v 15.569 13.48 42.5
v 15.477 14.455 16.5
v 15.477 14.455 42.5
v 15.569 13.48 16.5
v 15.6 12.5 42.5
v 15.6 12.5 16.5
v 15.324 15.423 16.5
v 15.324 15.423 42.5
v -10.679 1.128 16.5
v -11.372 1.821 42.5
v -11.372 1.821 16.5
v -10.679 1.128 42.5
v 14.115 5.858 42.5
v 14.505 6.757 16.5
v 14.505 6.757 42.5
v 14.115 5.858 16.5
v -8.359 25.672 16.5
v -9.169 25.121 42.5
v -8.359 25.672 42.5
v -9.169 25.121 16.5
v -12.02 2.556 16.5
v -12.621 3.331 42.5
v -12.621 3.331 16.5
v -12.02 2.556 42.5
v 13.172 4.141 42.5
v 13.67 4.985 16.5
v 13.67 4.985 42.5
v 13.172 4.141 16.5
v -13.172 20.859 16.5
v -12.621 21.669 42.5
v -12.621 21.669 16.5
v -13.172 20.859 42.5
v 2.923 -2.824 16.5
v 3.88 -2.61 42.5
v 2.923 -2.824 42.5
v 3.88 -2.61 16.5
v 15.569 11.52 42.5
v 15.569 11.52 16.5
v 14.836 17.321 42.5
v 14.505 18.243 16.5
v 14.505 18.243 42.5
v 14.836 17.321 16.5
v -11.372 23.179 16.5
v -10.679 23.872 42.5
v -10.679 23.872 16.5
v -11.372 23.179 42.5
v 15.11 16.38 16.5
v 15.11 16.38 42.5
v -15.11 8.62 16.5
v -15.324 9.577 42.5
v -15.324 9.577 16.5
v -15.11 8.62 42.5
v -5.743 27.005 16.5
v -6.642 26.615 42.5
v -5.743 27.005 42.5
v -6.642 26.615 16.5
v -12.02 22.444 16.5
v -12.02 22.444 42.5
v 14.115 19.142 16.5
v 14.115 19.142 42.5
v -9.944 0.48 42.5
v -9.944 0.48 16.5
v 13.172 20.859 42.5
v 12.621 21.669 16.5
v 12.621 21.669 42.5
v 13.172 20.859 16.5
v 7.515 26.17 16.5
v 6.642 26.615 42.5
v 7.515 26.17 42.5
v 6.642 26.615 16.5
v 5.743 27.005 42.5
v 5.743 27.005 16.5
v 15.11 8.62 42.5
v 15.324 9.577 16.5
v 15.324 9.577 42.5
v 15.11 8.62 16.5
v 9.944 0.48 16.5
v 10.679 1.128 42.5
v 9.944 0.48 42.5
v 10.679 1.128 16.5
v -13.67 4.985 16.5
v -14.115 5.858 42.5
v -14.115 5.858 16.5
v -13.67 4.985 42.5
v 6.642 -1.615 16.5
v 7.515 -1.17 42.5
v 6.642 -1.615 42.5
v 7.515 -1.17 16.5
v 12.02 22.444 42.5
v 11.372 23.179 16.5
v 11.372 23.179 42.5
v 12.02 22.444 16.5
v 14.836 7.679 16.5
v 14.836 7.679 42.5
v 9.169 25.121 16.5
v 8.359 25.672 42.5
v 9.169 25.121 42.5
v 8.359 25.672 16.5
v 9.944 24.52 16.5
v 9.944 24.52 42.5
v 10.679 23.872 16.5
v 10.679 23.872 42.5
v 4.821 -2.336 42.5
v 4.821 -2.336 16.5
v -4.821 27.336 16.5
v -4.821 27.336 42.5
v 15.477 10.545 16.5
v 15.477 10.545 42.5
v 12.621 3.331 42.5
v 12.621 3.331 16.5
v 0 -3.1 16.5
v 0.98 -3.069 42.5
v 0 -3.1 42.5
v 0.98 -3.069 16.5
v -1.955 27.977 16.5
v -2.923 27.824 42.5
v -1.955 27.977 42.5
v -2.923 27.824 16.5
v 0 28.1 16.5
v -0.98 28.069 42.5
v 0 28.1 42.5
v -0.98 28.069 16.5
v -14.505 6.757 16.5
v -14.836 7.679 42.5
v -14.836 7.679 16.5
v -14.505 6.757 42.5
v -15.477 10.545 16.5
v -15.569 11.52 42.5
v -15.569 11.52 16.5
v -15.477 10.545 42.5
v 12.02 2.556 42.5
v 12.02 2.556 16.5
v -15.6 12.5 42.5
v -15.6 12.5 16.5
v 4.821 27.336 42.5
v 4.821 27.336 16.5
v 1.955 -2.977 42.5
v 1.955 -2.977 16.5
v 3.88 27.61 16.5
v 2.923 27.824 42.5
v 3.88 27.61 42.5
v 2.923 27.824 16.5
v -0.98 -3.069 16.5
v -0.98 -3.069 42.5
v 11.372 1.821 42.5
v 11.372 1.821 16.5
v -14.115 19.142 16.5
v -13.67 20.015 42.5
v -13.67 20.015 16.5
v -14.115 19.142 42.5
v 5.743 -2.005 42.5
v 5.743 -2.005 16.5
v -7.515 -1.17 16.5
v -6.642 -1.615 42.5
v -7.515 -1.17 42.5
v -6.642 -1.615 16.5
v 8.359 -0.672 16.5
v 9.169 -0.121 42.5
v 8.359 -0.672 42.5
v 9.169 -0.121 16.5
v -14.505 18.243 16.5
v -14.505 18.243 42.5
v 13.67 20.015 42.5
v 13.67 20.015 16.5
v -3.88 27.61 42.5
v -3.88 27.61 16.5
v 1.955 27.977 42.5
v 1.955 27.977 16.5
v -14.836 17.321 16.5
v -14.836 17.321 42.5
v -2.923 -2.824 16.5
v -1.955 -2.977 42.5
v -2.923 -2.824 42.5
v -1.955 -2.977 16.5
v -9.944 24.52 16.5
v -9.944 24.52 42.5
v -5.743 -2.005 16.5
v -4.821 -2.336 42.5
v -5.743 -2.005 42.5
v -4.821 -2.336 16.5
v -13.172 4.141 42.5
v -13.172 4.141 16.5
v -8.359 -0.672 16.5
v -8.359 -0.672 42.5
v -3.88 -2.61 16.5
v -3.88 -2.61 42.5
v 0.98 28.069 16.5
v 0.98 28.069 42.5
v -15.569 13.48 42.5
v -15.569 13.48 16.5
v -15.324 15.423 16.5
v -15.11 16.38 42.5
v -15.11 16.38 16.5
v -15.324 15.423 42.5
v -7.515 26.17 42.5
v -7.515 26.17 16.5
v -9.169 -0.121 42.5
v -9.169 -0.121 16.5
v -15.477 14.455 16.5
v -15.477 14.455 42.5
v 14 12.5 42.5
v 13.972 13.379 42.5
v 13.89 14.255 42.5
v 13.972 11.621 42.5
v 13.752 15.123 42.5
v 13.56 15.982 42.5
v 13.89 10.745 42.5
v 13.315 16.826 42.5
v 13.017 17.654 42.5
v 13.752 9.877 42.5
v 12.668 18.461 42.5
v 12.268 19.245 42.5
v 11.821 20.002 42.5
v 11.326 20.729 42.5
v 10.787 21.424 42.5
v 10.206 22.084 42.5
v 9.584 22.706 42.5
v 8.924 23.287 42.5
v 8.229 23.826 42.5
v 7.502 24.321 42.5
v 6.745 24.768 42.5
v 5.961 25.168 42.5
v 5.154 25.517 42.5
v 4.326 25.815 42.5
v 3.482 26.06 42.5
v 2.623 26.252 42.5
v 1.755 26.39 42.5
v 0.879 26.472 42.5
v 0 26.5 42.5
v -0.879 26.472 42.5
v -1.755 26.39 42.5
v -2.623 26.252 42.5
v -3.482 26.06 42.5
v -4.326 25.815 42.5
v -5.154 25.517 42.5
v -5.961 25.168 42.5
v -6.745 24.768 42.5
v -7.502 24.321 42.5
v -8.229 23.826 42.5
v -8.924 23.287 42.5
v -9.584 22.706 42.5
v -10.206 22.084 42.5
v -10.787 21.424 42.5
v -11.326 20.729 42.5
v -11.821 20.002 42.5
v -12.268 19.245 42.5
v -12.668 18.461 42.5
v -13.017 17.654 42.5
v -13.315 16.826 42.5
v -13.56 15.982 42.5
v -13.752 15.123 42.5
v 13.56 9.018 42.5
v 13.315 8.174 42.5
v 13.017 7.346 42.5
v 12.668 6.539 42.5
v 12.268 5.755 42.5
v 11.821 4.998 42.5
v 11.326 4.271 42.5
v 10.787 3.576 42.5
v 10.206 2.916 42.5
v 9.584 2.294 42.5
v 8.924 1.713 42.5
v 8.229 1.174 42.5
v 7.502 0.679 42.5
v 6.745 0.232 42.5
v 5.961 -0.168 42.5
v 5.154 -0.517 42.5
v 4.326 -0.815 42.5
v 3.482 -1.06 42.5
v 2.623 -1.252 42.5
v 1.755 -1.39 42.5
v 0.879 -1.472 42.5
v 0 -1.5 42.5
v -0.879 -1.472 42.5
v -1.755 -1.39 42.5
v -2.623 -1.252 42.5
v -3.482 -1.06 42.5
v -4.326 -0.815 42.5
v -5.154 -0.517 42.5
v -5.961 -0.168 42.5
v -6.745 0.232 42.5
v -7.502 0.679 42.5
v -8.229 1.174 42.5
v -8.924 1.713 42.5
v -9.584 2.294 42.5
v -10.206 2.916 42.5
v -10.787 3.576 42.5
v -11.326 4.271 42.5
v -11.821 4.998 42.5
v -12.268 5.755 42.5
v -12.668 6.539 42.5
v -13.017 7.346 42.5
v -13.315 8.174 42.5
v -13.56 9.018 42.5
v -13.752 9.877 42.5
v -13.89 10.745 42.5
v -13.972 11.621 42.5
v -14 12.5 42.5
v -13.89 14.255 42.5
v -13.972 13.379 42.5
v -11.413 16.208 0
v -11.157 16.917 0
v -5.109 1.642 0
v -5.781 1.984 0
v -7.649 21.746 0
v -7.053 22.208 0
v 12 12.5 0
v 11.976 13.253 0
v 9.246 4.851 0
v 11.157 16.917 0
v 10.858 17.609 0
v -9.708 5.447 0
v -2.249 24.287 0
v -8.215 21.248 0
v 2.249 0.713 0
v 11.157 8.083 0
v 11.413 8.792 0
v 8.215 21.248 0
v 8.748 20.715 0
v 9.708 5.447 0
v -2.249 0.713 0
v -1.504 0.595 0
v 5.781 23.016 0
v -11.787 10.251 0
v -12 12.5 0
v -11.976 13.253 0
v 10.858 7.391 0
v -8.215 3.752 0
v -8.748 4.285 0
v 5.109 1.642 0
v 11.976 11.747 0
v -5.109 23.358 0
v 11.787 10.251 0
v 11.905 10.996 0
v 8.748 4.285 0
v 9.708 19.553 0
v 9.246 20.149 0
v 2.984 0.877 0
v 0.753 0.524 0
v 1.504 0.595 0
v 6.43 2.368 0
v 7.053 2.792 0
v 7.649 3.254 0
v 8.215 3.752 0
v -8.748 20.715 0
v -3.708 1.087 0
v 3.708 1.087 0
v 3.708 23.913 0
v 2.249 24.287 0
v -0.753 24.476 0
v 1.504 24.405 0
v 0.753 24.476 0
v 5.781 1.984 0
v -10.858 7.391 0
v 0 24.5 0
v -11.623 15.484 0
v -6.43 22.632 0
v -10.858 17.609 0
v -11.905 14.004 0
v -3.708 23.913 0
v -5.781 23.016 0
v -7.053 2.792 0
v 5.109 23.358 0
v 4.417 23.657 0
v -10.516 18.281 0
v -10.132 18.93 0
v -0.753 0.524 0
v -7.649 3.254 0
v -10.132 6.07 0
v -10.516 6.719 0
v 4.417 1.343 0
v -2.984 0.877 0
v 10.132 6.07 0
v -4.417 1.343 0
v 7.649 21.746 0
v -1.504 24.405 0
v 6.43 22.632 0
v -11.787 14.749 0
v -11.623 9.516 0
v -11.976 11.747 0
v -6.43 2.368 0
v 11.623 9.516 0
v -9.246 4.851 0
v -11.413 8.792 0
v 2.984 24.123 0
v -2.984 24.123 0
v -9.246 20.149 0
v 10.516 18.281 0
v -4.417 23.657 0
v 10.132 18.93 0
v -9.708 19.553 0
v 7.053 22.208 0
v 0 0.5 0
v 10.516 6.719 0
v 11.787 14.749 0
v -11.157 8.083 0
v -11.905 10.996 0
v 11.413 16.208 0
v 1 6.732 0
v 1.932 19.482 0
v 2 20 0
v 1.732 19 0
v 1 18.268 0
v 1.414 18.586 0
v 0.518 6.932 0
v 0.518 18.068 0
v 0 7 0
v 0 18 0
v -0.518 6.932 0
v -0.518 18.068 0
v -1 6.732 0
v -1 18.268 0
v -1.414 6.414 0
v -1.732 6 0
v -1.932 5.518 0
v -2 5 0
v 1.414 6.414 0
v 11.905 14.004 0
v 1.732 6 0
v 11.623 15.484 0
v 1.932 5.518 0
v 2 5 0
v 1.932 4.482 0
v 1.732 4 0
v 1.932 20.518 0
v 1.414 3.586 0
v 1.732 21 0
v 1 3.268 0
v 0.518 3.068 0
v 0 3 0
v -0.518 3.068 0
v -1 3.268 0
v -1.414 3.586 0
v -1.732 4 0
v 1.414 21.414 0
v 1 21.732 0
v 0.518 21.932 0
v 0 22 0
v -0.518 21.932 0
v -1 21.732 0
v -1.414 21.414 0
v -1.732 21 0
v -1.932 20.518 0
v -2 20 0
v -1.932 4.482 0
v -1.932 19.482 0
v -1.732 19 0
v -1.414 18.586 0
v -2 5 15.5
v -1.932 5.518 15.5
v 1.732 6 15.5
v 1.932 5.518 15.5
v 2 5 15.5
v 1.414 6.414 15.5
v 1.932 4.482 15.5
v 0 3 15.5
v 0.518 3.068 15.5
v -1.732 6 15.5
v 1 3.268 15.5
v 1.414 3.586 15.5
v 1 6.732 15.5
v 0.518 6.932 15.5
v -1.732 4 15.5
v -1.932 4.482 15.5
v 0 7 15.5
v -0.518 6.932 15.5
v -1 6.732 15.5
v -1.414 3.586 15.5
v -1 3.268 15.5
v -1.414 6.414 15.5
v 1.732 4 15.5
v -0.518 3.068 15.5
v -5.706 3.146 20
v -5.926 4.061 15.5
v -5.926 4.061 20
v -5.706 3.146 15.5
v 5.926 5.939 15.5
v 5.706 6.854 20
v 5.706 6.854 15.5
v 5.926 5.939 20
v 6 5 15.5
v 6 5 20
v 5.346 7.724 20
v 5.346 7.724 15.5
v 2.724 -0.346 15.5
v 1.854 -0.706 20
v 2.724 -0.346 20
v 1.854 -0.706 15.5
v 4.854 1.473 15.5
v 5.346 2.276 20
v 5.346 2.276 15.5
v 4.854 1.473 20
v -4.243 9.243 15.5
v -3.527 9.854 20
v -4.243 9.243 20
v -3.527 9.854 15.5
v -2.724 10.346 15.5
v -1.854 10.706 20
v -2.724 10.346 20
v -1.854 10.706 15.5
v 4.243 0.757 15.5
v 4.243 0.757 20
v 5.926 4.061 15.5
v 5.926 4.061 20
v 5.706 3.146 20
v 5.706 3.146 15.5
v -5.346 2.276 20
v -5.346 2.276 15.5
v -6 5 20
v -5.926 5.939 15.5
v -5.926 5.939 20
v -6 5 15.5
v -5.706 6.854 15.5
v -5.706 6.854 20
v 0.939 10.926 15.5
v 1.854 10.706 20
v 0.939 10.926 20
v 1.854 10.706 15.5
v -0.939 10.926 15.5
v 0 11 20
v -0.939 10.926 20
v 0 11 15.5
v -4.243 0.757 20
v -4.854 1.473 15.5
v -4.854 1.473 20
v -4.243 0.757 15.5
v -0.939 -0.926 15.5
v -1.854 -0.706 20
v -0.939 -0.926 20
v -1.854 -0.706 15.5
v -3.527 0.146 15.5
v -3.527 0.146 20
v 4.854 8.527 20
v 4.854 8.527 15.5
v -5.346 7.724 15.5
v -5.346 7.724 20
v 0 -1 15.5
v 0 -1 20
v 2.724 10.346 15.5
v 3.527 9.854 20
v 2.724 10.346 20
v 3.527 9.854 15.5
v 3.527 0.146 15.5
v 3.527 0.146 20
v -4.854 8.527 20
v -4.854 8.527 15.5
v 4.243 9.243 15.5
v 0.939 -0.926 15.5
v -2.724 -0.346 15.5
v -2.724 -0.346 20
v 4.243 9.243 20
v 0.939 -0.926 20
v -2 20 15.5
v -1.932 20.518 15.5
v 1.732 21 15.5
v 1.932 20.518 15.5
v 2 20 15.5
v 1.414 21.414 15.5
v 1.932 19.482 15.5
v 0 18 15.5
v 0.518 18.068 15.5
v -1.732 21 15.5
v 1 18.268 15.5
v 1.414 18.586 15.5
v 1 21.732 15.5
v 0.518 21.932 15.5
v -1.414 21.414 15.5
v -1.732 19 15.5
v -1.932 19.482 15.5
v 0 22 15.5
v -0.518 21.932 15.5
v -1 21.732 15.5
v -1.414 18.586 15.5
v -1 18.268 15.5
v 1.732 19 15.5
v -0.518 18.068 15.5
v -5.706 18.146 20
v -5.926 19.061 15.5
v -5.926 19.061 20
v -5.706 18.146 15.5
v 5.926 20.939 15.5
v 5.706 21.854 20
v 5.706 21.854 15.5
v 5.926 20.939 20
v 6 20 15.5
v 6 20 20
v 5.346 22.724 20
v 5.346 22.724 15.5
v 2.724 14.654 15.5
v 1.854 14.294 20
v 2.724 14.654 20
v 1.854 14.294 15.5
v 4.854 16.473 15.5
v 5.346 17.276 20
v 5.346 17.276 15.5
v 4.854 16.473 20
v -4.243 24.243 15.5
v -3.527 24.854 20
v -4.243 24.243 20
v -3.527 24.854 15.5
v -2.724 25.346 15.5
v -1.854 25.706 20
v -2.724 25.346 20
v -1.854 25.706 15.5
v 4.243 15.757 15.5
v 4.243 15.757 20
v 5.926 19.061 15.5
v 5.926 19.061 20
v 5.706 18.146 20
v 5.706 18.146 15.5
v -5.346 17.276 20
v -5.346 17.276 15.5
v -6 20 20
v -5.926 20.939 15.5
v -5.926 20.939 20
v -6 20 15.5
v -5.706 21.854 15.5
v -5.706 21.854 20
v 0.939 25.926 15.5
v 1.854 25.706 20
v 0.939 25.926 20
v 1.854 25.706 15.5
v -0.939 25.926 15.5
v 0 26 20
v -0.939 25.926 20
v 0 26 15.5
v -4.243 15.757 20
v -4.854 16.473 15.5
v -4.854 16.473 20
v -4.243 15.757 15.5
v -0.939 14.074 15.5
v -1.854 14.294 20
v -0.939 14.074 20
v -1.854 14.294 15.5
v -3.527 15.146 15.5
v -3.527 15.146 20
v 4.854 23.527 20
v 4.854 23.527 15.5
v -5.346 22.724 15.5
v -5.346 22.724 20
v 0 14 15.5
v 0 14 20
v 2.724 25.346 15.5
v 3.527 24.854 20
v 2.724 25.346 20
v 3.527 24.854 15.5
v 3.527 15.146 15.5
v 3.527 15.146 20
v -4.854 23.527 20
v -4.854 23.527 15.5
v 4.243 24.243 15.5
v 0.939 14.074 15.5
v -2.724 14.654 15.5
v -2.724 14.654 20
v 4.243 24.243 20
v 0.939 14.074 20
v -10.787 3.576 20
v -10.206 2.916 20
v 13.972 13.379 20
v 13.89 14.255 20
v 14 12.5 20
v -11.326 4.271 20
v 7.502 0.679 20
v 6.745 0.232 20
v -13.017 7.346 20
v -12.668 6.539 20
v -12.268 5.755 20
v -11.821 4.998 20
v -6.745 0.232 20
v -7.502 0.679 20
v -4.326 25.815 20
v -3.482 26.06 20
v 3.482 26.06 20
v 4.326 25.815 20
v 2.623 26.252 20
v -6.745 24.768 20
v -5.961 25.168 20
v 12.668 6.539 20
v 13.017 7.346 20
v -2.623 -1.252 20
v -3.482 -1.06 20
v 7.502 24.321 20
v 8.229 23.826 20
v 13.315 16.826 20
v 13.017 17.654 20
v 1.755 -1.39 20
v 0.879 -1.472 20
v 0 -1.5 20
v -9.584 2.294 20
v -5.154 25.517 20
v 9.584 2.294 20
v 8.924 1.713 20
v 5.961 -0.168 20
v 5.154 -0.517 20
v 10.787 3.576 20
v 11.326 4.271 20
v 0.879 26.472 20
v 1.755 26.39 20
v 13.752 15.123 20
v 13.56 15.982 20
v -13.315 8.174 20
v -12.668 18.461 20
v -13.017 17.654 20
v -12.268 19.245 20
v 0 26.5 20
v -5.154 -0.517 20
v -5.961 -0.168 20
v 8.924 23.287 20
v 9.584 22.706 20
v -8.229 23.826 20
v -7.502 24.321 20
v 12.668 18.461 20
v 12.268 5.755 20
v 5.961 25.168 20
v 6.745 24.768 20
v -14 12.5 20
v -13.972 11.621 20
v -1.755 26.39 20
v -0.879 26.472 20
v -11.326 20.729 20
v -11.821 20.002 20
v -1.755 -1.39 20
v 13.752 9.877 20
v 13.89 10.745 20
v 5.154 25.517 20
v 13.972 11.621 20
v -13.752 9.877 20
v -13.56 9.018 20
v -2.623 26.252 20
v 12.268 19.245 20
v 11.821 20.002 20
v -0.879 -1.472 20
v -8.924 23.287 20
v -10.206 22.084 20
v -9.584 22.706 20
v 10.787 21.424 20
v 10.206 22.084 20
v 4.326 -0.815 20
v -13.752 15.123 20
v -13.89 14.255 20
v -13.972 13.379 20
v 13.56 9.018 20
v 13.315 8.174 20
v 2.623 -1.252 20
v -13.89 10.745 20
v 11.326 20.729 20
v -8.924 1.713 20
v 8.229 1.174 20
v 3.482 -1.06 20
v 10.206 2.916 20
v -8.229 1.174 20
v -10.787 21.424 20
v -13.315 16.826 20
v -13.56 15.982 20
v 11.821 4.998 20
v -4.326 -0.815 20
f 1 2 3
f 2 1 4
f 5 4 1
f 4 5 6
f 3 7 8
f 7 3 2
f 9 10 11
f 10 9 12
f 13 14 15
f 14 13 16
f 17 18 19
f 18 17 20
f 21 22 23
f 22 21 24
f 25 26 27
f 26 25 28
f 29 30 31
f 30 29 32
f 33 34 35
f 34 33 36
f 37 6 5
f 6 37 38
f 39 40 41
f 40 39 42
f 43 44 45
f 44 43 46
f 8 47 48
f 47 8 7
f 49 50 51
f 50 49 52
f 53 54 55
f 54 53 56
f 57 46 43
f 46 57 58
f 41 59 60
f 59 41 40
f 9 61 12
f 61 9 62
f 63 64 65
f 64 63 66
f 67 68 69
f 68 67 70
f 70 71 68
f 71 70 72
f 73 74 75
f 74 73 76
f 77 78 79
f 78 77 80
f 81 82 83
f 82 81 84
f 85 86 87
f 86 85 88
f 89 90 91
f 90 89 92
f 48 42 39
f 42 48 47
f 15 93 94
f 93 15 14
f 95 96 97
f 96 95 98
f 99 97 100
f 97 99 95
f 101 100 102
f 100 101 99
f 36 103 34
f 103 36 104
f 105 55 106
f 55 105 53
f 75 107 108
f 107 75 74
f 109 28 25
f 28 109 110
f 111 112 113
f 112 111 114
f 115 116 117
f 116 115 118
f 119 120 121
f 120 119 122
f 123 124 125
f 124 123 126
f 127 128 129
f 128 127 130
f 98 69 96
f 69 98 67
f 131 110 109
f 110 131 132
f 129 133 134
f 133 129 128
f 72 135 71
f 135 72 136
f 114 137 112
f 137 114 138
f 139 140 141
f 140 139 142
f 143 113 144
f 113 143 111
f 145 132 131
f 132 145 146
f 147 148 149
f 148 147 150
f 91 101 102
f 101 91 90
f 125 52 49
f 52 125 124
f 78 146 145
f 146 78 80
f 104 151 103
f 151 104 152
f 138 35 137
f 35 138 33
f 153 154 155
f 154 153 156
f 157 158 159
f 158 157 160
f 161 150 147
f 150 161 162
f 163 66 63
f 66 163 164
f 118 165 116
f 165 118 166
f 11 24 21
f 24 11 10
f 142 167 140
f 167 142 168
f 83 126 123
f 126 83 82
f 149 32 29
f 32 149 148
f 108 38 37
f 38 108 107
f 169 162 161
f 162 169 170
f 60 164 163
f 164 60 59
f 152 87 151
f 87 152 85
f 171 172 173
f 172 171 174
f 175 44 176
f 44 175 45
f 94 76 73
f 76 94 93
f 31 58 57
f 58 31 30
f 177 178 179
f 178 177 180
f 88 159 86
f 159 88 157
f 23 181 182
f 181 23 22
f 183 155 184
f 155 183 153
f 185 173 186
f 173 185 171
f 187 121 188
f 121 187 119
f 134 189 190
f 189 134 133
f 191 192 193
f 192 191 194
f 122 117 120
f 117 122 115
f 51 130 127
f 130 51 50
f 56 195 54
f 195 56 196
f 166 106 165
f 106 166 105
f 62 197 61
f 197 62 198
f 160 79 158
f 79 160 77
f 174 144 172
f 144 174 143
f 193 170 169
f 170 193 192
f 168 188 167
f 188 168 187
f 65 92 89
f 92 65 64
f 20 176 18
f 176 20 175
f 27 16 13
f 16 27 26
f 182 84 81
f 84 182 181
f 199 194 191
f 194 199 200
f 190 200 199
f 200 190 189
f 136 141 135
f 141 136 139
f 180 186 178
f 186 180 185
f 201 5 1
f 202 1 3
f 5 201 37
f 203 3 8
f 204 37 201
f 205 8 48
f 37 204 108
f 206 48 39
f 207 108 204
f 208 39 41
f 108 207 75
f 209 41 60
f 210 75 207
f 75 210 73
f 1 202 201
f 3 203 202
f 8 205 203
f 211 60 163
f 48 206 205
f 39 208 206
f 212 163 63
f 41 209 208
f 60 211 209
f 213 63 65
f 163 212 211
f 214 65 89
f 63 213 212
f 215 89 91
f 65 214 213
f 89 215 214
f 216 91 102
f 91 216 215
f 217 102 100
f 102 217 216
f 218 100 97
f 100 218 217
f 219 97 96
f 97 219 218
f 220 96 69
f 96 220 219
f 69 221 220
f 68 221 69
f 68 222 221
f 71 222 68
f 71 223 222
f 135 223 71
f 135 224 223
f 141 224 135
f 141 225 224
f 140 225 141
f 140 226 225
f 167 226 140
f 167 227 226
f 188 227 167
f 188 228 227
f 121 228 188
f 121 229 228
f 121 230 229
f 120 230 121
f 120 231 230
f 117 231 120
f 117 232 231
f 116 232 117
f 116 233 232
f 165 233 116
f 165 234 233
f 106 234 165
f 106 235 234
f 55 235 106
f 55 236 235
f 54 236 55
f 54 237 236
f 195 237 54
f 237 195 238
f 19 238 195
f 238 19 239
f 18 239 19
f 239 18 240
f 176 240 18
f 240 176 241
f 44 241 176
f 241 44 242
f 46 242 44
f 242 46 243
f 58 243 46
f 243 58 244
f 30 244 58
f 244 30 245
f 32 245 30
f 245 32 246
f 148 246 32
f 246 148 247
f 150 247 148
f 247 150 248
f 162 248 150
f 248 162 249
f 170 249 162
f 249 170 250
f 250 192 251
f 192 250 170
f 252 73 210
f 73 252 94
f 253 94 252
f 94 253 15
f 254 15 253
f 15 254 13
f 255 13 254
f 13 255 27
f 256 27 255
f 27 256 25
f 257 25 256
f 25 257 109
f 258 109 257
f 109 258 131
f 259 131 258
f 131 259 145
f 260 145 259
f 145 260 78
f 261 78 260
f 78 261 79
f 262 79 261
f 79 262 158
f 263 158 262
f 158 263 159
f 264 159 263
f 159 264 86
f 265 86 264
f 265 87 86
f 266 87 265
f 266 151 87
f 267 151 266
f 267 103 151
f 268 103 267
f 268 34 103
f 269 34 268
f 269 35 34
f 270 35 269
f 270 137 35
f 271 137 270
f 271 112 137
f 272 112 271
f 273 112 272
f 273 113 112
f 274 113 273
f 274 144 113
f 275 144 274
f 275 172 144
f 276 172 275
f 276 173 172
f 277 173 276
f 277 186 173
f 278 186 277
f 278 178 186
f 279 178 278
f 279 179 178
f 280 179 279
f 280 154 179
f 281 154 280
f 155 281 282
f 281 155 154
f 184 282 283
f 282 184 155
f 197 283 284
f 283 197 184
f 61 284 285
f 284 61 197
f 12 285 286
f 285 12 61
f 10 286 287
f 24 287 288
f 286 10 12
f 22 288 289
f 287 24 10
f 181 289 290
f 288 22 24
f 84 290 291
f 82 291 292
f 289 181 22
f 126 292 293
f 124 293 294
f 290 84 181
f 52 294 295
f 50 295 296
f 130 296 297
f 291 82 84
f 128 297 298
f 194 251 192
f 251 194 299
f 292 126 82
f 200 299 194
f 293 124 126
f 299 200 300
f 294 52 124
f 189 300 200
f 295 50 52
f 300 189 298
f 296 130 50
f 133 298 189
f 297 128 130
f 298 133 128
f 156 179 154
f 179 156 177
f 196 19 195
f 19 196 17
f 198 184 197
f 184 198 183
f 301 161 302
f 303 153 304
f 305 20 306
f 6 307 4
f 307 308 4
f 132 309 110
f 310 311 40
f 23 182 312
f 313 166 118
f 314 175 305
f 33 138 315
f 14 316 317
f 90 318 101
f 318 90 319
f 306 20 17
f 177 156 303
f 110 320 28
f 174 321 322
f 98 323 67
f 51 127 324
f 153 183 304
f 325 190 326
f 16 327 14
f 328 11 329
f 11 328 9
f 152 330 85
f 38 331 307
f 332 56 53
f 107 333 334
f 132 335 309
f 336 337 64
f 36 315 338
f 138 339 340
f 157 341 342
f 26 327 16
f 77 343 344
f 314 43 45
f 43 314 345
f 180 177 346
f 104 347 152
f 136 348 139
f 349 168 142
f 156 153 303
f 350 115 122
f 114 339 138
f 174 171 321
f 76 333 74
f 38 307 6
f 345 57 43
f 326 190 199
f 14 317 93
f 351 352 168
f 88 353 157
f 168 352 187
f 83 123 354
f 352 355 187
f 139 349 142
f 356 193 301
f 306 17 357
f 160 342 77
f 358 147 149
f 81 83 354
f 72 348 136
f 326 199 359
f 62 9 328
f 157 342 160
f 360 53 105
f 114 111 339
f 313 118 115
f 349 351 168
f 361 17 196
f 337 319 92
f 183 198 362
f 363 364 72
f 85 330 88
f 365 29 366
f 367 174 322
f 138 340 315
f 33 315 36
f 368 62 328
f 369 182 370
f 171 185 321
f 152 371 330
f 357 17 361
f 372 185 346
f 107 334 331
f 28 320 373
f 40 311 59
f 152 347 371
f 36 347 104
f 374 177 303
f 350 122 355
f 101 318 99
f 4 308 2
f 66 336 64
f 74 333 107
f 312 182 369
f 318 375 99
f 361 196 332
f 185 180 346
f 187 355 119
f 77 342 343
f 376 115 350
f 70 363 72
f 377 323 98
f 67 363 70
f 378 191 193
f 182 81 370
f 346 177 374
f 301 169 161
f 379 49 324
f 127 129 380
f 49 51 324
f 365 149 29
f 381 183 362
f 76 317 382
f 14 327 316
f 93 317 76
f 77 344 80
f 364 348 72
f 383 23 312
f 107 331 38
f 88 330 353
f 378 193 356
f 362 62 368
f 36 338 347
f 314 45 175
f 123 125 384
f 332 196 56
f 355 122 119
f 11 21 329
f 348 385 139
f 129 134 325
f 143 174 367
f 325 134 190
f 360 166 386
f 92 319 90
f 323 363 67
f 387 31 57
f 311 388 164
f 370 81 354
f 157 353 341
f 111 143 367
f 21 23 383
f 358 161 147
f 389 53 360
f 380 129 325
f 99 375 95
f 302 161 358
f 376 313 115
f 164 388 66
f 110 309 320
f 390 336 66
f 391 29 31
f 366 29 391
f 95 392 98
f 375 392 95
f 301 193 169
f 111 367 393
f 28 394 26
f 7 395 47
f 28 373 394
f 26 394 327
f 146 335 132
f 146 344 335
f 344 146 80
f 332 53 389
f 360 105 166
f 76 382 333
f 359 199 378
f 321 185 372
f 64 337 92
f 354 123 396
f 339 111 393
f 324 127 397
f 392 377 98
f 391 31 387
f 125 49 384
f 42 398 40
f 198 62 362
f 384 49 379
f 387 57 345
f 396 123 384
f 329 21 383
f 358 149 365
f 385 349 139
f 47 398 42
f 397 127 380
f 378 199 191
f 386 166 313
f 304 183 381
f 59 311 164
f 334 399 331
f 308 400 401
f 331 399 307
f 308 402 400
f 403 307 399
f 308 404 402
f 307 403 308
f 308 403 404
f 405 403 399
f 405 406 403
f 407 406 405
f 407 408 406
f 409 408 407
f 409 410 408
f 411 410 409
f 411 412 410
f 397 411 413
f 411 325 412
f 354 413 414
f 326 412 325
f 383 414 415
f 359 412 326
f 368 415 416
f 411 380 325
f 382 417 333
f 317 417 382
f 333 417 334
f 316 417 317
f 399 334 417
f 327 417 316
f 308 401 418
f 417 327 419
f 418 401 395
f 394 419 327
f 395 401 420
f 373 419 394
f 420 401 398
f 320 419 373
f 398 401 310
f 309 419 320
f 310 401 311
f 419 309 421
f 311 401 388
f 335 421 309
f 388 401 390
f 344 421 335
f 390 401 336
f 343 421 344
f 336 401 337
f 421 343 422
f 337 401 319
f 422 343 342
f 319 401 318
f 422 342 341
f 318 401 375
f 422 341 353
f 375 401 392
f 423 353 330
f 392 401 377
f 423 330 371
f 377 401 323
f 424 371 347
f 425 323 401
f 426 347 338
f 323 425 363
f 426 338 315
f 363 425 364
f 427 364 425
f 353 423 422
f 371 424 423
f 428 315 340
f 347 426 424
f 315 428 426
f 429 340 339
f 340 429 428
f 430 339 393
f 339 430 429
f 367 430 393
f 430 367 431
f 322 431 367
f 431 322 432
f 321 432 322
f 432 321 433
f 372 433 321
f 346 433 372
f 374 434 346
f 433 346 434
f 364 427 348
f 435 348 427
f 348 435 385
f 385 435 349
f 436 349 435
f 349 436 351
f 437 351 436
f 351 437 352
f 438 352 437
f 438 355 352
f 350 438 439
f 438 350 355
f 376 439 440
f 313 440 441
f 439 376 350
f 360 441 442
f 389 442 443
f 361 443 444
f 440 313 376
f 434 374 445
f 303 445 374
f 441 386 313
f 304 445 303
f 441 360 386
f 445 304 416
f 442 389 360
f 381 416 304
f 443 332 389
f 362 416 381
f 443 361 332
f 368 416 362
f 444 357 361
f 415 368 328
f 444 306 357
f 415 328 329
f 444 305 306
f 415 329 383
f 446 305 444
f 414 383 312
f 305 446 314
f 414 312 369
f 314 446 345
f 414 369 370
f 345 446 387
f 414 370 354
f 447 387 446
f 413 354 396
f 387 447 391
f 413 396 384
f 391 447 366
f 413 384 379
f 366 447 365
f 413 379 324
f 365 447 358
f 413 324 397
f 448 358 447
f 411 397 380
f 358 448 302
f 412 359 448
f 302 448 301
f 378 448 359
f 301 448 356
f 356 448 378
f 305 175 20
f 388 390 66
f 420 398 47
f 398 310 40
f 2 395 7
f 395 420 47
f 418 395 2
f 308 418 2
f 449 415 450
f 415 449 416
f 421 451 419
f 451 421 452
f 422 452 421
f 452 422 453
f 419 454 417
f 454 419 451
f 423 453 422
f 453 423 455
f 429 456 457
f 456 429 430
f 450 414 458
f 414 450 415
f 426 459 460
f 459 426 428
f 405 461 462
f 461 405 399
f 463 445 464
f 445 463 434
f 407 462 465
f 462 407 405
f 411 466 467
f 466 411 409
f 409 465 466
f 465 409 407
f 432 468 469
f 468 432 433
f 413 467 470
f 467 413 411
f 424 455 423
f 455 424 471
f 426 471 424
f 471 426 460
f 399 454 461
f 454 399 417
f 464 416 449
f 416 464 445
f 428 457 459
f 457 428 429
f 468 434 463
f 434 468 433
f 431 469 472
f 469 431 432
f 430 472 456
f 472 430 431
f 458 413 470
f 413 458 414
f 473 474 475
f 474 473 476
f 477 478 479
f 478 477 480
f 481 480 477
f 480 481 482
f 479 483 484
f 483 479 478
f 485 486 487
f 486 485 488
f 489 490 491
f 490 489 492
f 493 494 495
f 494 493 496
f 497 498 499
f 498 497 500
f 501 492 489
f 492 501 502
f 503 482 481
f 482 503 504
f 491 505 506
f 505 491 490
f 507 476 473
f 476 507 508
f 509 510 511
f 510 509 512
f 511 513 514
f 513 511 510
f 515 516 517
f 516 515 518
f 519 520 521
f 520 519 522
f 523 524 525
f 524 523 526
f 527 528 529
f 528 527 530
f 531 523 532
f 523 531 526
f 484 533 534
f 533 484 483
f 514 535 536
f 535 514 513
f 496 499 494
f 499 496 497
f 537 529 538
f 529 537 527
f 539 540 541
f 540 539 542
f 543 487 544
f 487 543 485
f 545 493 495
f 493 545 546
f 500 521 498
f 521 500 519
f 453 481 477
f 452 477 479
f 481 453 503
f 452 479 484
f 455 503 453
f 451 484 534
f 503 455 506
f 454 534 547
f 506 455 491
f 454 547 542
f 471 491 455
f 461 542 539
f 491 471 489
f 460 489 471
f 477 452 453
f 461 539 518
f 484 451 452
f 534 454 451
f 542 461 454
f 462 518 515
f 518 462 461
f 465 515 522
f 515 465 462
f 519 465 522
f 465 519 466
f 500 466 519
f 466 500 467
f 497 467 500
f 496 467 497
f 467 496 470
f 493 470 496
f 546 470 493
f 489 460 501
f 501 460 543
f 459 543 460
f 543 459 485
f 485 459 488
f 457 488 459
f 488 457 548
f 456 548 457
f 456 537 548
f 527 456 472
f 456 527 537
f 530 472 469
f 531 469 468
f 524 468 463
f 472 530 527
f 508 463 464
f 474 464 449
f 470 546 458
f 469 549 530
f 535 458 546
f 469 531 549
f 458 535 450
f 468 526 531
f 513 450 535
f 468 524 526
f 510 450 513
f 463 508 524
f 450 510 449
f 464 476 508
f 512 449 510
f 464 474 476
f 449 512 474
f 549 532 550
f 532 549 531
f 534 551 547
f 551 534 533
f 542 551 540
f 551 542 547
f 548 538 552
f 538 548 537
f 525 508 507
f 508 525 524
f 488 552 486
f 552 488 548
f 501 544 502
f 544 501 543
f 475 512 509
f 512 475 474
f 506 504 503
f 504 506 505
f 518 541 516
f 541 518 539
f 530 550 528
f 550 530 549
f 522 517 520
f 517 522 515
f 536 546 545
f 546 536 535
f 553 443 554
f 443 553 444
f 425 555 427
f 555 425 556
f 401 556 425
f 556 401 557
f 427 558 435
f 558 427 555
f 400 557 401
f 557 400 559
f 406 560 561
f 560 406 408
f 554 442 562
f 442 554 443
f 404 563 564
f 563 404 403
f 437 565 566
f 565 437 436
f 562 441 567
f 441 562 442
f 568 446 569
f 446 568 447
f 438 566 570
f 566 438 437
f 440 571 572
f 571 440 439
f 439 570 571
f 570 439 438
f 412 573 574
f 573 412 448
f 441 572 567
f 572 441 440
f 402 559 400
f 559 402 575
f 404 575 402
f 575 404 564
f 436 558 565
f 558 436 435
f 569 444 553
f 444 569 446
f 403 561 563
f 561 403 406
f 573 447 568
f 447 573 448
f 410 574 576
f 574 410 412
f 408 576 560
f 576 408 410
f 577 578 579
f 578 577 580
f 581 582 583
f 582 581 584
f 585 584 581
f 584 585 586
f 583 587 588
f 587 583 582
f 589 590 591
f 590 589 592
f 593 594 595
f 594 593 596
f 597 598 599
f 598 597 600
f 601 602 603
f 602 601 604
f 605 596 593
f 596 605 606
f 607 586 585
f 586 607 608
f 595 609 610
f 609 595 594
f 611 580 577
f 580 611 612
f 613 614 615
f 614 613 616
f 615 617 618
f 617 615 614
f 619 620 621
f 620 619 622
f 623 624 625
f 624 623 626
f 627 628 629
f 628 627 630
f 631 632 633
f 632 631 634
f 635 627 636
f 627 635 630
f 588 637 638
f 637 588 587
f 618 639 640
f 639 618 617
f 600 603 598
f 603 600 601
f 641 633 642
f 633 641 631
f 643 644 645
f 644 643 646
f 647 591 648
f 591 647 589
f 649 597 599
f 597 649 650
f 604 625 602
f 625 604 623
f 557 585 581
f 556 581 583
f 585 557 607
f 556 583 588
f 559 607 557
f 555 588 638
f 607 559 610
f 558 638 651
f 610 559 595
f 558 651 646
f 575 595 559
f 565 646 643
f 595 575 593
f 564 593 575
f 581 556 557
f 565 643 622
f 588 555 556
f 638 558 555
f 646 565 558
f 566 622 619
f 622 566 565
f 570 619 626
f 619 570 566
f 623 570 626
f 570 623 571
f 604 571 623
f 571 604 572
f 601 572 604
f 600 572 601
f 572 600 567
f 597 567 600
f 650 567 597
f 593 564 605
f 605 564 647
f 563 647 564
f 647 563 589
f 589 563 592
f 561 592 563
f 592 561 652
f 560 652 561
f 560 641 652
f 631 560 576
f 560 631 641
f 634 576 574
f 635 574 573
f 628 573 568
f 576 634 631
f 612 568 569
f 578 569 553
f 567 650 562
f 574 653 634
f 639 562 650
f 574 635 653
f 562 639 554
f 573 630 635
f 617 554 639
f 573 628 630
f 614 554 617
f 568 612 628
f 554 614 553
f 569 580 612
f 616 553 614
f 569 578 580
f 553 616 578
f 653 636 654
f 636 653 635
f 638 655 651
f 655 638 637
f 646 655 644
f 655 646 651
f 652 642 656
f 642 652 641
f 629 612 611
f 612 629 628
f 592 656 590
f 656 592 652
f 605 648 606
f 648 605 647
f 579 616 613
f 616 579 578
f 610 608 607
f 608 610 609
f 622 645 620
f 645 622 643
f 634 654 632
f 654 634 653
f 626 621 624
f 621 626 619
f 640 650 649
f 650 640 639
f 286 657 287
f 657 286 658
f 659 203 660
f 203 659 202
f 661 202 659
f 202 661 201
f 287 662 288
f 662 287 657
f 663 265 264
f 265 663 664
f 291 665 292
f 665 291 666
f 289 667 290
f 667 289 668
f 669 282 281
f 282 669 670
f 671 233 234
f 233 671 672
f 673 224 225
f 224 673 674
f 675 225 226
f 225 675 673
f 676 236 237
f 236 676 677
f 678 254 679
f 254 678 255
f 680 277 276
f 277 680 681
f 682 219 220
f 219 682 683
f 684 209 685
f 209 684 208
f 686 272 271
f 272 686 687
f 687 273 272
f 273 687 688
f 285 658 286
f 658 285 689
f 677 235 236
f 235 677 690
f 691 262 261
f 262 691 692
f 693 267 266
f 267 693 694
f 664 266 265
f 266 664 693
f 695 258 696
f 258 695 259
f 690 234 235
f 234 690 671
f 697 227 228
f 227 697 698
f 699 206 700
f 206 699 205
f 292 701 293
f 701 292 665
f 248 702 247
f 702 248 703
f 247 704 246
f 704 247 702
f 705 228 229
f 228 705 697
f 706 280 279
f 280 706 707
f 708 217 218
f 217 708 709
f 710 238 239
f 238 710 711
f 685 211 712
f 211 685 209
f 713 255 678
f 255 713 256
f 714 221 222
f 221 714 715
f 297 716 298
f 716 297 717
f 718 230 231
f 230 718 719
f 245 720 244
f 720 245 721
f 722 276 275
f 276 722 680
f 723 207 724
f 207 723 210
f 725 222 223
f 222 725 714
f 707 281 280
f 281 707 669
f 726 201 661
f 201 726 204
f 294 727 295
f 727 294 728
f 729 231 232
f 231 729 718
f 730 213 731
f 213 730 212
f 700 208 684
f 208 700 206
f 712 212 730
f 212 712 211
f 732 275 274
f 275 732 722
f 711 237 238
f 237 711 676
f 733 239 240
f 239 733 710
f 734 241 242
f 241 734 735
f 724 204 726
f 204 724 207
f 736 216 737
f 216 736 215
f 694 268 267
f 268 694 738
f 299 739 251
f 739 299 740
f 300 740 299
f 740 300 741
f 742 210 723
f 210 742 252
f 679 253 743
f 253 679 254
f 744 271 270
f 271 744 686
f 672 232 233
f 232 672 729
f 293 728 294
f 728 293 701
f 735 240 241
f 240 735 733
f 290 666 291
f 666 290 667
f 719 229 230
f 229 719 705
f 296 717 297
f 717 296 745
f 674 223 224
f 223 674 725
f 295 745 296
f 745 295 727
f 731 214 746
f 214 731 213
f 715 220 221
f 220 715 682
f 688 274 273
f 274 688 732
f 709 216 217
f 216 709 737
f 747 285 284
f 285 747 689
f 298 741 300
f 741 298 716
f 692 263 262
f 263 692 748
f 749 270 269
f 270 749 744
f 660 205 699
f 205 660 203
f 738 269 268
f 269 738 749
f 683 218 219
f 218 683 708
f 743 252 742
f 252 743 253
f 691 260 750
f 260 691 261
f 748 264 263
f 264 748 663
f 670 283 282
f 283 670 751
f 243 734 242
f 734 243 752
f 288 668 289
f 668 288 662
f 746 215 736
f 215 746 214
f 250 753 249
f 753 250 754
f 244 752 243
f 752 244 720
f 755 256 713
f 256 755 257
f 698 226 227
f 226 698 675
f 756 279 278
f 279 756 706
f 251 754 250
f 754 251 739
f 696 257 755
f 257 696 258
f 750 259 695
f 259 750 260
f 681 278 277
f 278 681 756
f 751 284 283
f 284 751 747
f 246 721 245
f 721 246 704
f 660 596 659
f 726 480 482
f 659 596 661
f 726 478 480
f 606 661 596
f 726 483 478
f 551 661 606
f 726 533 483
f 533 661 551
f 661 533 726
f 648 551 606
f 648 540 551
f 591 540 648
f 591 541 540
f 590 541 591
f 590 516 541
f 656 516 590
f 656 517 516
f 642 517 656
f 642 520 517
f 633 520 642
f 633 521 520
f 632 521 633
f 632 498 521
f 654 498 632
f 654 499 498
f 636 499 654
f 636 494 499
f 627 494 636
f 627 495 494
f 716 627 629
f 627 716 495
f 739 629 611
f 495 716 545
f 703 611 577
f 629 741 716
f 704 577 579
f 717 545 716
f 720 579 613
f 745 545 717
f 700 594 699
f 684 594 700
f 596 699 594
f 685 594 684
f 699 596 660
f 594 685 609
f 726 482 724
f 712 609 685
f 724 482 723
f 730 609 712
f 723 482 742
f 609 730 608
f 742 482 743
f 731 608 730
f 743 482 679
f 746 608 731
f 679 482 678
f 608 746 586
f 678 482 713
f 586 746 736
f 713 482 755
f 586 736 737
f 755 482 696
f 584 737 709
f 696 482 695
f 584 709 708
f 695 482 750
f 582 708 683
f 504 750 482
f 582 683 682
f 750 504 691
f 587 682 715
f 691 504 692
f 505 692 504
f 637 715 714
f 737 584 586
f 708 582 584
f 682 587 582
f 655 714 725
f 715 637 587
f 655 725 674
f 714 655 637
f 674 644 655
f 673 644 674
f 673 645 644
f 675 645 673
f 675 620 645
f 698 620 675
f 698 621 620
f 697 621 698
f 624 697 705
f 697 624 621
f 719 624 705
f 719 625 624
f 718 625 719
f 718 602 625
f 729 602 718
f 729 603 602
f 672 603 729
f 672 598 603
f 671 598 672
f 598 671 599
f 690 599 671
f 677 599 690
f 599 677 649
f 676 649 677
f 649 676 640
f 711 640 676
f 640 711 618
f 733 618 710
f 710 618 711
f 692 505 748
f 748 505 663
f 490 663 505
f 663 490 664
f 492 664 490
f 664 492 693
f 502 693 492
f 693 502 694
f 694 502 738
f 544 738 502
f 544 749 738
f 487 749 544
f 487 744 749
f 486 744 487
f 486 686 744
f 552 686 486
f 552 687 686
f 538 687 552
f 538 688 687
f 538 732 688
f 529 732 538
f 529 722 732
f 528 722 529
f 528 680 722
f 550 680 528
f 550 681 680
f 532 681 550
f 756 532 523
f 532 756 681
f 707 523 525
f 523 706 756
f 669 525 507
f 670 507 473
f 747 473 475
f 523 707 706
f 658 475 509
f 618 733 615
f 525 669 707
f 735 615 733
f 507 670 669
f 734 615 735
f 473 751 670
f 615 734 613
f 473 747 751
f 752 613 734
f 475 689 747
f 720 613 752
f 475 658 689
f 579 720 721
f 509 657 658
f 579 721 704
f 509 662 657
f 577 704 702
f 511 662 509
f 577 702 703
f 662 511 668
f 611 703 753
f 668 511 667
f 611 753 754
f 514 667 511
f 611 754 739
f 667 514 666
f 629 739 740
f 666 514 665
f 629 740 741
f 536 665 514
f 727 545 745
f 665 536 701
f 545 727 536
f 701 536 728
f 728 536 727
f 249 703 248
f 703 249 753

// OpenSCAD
difference() {
  union(){
    *translate([-10,0]) cube([20,31.5,16.5]);
    translate([0,12.5,16.5]) cylinder(d=31.2,h=26,$fn=100);
    translate([0,12.5,0]) cylinder(d1=24,d2=31.2,h=16.5,$fn=100);
  }
  translate([0,12.5,20]) cylinder(d=28,h=40,$fn=100);
  *translate([-6.5,-20.01,-.01]) cube([13,48.02,13]);
  for(y=[5,20])
    translate([0,y,-1]) {
      cylinder(d=4,h=22,$fn=24);
      translate([0,0,16.5]) cylinder(d=12,h=20,$fn=40);
    }
}
